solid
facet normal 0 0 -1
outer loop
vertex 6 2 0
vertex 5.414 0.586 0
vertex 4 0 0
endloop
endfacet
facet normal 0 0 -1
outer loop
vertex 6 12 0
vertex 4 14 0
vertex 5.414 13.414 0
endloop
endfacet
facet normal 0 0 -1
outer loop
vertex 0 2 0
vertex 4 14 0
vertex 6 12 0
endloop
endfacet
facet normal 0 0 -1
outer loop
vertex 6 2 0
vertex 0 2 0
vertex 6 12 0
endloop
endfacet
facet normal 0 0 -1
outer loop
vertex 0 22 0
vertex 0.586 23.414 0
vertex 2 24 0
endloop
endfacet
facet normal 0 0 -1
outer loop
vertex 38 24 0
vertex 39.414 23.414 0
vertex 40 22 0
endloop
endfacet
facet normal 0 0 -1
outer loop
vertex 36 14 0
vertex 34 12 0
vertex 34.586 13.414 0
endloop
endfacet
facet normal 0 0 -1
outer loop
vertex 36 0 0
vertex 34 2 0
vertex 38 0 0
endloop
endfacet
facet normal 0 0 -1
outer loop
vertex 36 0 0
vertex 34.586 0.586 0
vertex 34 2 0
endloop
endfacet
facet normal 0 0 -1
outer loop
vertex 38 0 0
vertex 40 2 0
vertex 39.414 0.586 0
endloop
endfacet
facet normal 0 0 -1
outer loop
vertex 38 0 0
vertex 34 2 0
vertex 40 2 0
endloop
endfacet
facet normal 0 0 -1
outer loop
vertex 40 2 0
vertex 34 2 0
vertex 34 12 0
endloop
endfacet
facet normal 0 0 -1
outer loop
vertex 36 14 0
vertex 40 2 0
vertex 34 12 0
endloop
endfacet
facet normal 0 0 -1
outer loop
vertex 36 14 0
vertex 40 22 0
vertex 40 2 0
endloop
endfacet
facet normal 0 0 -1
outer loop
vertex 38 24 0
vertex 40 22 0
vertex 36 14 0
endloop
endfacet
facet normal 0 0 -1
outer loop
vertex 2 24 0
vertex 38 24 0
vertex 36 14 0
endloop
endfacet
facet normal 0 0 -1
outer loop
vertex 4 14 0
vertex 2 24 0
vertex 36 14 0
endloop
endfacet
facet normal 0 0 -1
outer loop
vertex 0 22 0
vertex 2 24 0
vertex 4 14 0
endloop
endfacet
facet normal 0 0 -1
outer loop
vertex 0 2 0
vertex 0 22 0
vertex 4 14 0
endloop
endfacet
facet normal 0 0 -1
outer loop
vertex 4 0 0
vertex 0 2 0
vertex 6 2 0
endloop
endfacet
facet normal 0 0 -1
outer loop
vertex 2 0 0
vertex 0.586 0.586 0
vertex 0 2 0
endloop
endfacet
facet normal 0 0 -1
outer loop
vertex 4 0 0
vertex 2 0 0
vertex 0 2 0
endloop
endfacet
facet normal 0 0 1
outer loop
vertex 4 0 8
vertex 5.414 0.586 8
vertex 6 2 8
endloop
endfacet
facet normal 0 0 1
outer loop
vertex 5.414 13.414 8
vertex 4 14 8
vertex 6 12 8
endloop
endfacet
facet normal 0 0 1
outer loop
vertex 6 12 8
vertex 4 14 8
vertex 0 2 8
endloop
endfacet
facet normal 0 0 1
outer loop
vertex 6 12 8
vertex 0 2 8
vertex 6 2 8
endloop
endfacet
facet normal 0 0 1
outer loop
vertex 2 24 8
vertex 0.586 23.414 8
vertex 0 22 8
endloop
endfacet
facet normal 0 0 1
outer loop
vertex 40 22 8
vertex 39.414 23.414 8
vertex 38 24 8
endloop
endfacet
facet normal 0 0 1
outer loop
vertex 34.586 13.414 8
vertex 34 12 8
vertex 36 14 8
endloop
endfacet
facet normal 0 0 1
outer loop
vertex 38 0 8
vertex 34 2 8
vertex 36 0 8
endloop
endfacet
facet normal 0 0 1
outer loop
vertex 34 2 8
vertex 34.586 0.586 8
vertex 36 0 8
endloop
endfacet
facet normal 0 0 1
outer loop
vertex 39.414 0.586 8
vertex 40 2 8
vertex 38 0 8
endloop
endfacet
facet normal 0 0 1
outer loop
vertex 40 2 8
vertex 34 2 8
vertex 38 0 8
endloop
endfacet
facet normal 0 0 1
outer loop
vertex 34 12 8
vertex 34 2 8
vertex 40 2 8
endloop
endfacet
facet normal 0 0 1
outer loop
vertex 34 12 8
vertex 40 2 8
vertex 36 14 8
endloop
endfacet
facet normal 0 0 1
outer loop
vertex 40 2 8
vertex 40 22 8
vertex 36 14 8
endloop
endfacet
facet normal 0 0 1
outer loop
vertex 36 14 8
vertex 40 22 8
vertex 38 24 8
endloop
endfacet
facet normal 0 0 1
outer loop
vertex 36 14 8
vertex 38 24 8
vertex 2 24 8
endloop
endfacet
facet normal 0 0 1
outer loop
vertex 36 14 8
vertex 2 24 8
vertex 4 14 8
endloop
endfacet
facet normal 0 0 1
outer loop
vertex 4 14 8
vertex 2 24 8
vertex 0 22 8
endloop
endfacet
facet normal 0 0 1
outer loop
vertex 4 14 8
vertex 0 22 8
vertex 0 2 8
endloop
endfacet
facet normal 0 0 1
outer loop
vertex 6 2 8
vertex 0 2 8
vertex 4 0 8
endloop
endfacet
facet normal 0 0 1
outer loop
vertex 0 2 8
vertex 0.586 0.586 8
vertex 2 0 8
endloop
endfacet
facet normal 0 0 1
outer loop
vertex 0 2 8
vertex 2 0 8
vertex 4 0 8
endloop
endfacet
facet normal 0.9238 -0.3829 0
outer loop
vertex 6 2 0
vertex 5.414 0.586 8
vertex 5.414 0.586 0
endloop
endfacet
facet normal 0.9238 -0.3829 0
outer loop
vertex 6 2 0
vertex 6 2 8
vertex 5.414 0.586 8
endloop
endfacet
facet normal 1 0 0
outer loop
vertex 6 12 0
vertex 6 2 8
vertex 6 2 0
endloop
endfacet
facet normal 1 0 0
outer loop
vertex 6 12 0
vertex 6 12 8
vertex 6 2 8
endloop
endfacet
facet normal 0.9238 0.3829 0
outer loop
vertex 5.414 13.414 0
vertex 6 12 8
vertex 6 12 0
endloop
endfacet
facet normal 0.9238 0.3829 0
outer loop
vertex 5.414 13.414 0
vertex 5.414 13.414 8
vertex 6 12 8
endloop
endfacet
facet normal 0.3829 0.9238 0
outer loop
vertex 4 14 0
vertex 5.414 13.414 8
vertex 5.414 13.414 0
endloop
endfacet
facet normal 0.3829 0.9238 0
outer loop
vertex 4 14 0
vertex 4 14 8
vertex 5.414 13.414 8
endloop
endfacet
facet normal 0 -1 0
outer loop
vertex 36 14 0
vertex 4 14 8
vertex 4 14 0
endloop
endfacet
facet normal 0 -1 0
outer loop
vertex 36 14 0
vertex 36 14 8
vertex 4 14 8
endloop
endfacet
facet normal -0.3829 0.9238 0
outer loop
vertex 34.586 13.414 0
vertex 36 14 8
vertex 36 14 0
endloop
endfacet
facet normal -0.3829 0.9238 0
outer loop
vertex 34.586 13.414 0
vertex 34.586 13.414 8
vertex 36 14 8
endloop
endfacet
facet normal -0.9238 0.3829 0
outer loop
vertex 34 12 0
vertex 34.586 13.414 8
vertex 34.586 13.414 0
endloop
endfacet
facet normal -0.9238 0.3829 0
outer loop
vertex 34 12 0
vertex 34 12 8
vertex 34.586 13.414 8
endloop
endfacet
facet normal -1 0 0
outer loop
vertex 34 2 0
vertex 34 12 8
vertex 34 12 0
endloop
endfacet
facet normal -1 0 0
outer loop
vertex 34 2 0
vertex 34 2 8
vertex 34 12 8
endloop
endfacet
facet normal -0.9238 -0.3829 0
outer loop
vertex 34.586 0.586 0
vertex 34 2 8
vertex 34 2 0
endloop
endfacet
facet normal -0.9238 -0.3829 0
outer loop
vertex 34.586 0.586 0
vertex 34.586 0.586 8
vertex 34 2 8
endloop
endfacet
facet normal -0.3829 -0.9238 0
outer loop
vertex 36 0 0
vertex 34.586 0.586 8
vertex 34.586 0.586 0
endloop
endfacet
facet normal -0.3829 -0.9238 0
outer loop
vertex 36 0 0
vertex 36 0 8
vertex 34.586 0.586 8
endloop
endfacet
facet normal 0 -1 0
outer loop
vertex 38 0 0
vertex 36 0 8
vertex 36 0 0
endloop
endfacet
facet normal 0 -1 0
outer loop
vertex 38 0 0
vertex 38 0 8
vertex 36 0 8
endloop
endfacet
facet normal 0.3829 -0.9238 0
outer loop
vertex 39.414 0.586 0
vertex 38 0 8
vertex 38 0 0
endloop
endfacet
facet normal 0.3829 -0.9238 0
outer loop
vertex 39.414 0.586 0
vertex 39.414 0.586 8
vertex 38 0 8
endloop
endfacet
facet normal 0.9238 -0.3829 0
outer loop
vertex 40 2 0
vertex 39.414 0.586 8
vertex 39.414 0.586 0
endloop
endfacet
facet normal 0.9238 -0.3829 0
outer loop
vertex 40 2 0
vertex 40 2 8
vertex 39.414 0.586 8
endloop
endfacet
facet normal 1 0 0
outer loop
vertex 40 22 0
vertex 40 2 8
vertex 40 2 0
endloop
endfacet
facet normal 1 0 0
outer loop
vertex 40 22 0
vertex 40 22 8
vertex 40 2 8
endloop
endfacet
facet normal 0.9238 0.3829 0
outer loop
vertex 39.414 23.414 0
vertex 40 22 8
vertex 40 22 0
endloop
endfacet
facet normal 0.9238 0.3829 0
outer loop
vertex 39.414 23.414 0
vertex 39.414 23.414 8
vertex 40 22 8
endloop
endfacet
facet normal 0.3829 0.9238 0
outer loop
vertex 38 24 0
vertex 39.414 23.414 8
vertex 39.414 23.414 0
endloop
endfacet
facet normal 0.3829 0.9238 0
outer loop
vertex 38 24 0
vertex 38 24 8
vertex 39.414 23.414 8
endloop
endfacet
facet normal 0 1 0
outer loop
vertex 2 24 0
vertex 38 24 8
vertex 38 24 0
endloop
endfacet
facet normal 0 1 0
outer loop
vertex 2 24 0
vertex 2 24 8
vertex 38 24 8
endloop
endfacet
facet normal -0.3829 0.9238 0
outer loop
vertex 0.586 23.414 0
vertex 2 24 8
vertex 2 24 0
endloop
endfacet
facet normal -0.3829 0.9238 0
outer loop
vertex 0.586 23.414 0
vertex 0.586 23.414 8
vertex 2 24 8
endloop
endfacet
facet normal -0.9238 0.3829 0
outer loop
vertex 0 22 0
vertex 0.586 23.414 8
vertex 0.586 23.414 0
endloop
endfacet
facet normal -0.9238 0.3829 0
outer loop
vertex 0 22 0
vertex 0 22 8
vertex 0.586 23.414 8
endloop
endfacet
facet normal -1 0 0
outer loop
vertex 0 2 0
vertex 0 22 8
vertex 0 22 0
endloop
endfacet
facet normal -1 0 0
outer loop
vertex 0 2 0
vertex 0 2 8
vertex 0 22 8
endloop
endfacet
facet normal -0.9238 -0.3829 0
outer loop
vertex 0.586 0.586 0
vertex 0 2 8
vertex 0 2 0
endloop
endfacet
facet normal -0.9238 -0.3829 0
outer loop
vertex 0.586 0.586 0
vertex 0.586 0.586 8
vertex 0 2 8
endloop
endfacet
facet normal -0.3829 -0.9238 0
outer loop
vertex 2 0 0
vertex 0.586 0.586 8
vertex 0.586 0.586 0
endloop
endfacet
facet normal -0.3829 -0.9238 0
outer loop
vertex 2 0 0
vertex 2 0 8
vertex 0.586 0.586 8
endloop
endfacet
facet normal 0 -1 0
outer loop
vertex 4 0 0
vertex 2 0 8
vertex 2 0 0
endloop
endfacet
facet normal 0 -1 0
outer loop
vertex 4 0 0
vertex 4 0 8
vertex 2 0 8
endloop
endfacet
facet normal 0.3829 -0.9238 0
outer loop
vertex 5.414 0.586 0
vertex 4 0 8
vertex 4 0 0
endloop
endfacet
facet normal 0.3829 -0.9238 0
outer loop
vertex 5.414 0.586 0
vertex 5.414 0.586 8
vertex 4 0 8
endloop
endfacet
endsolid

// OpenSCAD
$fn = 32;

// ----------------------------------------------------------------------
// Clip blank: staple clip, 8 mm thick
// ----------------------------------------------------------------------

// --- parameters (mm) ---
profile_height = 8;       // extrusion height
profile_points = 24;      // points of the closed outline

profile = [[0, 2], [0.586, 0.586], [2, 0], [4, 0], [5.414, 0.586], [6, 2], [6, 12], [5.414, 13.414], [4, 14], [36, 14], [34.586, 13.414], [34, 12], [34, 2], [34.586, 0.586], [36, 0], [38, 0], [39.414, 0.586], [40, 2], [40, 22], [39.414, 23.414], [38, 24], [2, 24], [0.586, 23.414], [0, 22]];  // single closed polygon, 24 points, counter clockwise

// --- the one profile operation ---
linear_extrude(height = profile_height) polygon(points = profile);
